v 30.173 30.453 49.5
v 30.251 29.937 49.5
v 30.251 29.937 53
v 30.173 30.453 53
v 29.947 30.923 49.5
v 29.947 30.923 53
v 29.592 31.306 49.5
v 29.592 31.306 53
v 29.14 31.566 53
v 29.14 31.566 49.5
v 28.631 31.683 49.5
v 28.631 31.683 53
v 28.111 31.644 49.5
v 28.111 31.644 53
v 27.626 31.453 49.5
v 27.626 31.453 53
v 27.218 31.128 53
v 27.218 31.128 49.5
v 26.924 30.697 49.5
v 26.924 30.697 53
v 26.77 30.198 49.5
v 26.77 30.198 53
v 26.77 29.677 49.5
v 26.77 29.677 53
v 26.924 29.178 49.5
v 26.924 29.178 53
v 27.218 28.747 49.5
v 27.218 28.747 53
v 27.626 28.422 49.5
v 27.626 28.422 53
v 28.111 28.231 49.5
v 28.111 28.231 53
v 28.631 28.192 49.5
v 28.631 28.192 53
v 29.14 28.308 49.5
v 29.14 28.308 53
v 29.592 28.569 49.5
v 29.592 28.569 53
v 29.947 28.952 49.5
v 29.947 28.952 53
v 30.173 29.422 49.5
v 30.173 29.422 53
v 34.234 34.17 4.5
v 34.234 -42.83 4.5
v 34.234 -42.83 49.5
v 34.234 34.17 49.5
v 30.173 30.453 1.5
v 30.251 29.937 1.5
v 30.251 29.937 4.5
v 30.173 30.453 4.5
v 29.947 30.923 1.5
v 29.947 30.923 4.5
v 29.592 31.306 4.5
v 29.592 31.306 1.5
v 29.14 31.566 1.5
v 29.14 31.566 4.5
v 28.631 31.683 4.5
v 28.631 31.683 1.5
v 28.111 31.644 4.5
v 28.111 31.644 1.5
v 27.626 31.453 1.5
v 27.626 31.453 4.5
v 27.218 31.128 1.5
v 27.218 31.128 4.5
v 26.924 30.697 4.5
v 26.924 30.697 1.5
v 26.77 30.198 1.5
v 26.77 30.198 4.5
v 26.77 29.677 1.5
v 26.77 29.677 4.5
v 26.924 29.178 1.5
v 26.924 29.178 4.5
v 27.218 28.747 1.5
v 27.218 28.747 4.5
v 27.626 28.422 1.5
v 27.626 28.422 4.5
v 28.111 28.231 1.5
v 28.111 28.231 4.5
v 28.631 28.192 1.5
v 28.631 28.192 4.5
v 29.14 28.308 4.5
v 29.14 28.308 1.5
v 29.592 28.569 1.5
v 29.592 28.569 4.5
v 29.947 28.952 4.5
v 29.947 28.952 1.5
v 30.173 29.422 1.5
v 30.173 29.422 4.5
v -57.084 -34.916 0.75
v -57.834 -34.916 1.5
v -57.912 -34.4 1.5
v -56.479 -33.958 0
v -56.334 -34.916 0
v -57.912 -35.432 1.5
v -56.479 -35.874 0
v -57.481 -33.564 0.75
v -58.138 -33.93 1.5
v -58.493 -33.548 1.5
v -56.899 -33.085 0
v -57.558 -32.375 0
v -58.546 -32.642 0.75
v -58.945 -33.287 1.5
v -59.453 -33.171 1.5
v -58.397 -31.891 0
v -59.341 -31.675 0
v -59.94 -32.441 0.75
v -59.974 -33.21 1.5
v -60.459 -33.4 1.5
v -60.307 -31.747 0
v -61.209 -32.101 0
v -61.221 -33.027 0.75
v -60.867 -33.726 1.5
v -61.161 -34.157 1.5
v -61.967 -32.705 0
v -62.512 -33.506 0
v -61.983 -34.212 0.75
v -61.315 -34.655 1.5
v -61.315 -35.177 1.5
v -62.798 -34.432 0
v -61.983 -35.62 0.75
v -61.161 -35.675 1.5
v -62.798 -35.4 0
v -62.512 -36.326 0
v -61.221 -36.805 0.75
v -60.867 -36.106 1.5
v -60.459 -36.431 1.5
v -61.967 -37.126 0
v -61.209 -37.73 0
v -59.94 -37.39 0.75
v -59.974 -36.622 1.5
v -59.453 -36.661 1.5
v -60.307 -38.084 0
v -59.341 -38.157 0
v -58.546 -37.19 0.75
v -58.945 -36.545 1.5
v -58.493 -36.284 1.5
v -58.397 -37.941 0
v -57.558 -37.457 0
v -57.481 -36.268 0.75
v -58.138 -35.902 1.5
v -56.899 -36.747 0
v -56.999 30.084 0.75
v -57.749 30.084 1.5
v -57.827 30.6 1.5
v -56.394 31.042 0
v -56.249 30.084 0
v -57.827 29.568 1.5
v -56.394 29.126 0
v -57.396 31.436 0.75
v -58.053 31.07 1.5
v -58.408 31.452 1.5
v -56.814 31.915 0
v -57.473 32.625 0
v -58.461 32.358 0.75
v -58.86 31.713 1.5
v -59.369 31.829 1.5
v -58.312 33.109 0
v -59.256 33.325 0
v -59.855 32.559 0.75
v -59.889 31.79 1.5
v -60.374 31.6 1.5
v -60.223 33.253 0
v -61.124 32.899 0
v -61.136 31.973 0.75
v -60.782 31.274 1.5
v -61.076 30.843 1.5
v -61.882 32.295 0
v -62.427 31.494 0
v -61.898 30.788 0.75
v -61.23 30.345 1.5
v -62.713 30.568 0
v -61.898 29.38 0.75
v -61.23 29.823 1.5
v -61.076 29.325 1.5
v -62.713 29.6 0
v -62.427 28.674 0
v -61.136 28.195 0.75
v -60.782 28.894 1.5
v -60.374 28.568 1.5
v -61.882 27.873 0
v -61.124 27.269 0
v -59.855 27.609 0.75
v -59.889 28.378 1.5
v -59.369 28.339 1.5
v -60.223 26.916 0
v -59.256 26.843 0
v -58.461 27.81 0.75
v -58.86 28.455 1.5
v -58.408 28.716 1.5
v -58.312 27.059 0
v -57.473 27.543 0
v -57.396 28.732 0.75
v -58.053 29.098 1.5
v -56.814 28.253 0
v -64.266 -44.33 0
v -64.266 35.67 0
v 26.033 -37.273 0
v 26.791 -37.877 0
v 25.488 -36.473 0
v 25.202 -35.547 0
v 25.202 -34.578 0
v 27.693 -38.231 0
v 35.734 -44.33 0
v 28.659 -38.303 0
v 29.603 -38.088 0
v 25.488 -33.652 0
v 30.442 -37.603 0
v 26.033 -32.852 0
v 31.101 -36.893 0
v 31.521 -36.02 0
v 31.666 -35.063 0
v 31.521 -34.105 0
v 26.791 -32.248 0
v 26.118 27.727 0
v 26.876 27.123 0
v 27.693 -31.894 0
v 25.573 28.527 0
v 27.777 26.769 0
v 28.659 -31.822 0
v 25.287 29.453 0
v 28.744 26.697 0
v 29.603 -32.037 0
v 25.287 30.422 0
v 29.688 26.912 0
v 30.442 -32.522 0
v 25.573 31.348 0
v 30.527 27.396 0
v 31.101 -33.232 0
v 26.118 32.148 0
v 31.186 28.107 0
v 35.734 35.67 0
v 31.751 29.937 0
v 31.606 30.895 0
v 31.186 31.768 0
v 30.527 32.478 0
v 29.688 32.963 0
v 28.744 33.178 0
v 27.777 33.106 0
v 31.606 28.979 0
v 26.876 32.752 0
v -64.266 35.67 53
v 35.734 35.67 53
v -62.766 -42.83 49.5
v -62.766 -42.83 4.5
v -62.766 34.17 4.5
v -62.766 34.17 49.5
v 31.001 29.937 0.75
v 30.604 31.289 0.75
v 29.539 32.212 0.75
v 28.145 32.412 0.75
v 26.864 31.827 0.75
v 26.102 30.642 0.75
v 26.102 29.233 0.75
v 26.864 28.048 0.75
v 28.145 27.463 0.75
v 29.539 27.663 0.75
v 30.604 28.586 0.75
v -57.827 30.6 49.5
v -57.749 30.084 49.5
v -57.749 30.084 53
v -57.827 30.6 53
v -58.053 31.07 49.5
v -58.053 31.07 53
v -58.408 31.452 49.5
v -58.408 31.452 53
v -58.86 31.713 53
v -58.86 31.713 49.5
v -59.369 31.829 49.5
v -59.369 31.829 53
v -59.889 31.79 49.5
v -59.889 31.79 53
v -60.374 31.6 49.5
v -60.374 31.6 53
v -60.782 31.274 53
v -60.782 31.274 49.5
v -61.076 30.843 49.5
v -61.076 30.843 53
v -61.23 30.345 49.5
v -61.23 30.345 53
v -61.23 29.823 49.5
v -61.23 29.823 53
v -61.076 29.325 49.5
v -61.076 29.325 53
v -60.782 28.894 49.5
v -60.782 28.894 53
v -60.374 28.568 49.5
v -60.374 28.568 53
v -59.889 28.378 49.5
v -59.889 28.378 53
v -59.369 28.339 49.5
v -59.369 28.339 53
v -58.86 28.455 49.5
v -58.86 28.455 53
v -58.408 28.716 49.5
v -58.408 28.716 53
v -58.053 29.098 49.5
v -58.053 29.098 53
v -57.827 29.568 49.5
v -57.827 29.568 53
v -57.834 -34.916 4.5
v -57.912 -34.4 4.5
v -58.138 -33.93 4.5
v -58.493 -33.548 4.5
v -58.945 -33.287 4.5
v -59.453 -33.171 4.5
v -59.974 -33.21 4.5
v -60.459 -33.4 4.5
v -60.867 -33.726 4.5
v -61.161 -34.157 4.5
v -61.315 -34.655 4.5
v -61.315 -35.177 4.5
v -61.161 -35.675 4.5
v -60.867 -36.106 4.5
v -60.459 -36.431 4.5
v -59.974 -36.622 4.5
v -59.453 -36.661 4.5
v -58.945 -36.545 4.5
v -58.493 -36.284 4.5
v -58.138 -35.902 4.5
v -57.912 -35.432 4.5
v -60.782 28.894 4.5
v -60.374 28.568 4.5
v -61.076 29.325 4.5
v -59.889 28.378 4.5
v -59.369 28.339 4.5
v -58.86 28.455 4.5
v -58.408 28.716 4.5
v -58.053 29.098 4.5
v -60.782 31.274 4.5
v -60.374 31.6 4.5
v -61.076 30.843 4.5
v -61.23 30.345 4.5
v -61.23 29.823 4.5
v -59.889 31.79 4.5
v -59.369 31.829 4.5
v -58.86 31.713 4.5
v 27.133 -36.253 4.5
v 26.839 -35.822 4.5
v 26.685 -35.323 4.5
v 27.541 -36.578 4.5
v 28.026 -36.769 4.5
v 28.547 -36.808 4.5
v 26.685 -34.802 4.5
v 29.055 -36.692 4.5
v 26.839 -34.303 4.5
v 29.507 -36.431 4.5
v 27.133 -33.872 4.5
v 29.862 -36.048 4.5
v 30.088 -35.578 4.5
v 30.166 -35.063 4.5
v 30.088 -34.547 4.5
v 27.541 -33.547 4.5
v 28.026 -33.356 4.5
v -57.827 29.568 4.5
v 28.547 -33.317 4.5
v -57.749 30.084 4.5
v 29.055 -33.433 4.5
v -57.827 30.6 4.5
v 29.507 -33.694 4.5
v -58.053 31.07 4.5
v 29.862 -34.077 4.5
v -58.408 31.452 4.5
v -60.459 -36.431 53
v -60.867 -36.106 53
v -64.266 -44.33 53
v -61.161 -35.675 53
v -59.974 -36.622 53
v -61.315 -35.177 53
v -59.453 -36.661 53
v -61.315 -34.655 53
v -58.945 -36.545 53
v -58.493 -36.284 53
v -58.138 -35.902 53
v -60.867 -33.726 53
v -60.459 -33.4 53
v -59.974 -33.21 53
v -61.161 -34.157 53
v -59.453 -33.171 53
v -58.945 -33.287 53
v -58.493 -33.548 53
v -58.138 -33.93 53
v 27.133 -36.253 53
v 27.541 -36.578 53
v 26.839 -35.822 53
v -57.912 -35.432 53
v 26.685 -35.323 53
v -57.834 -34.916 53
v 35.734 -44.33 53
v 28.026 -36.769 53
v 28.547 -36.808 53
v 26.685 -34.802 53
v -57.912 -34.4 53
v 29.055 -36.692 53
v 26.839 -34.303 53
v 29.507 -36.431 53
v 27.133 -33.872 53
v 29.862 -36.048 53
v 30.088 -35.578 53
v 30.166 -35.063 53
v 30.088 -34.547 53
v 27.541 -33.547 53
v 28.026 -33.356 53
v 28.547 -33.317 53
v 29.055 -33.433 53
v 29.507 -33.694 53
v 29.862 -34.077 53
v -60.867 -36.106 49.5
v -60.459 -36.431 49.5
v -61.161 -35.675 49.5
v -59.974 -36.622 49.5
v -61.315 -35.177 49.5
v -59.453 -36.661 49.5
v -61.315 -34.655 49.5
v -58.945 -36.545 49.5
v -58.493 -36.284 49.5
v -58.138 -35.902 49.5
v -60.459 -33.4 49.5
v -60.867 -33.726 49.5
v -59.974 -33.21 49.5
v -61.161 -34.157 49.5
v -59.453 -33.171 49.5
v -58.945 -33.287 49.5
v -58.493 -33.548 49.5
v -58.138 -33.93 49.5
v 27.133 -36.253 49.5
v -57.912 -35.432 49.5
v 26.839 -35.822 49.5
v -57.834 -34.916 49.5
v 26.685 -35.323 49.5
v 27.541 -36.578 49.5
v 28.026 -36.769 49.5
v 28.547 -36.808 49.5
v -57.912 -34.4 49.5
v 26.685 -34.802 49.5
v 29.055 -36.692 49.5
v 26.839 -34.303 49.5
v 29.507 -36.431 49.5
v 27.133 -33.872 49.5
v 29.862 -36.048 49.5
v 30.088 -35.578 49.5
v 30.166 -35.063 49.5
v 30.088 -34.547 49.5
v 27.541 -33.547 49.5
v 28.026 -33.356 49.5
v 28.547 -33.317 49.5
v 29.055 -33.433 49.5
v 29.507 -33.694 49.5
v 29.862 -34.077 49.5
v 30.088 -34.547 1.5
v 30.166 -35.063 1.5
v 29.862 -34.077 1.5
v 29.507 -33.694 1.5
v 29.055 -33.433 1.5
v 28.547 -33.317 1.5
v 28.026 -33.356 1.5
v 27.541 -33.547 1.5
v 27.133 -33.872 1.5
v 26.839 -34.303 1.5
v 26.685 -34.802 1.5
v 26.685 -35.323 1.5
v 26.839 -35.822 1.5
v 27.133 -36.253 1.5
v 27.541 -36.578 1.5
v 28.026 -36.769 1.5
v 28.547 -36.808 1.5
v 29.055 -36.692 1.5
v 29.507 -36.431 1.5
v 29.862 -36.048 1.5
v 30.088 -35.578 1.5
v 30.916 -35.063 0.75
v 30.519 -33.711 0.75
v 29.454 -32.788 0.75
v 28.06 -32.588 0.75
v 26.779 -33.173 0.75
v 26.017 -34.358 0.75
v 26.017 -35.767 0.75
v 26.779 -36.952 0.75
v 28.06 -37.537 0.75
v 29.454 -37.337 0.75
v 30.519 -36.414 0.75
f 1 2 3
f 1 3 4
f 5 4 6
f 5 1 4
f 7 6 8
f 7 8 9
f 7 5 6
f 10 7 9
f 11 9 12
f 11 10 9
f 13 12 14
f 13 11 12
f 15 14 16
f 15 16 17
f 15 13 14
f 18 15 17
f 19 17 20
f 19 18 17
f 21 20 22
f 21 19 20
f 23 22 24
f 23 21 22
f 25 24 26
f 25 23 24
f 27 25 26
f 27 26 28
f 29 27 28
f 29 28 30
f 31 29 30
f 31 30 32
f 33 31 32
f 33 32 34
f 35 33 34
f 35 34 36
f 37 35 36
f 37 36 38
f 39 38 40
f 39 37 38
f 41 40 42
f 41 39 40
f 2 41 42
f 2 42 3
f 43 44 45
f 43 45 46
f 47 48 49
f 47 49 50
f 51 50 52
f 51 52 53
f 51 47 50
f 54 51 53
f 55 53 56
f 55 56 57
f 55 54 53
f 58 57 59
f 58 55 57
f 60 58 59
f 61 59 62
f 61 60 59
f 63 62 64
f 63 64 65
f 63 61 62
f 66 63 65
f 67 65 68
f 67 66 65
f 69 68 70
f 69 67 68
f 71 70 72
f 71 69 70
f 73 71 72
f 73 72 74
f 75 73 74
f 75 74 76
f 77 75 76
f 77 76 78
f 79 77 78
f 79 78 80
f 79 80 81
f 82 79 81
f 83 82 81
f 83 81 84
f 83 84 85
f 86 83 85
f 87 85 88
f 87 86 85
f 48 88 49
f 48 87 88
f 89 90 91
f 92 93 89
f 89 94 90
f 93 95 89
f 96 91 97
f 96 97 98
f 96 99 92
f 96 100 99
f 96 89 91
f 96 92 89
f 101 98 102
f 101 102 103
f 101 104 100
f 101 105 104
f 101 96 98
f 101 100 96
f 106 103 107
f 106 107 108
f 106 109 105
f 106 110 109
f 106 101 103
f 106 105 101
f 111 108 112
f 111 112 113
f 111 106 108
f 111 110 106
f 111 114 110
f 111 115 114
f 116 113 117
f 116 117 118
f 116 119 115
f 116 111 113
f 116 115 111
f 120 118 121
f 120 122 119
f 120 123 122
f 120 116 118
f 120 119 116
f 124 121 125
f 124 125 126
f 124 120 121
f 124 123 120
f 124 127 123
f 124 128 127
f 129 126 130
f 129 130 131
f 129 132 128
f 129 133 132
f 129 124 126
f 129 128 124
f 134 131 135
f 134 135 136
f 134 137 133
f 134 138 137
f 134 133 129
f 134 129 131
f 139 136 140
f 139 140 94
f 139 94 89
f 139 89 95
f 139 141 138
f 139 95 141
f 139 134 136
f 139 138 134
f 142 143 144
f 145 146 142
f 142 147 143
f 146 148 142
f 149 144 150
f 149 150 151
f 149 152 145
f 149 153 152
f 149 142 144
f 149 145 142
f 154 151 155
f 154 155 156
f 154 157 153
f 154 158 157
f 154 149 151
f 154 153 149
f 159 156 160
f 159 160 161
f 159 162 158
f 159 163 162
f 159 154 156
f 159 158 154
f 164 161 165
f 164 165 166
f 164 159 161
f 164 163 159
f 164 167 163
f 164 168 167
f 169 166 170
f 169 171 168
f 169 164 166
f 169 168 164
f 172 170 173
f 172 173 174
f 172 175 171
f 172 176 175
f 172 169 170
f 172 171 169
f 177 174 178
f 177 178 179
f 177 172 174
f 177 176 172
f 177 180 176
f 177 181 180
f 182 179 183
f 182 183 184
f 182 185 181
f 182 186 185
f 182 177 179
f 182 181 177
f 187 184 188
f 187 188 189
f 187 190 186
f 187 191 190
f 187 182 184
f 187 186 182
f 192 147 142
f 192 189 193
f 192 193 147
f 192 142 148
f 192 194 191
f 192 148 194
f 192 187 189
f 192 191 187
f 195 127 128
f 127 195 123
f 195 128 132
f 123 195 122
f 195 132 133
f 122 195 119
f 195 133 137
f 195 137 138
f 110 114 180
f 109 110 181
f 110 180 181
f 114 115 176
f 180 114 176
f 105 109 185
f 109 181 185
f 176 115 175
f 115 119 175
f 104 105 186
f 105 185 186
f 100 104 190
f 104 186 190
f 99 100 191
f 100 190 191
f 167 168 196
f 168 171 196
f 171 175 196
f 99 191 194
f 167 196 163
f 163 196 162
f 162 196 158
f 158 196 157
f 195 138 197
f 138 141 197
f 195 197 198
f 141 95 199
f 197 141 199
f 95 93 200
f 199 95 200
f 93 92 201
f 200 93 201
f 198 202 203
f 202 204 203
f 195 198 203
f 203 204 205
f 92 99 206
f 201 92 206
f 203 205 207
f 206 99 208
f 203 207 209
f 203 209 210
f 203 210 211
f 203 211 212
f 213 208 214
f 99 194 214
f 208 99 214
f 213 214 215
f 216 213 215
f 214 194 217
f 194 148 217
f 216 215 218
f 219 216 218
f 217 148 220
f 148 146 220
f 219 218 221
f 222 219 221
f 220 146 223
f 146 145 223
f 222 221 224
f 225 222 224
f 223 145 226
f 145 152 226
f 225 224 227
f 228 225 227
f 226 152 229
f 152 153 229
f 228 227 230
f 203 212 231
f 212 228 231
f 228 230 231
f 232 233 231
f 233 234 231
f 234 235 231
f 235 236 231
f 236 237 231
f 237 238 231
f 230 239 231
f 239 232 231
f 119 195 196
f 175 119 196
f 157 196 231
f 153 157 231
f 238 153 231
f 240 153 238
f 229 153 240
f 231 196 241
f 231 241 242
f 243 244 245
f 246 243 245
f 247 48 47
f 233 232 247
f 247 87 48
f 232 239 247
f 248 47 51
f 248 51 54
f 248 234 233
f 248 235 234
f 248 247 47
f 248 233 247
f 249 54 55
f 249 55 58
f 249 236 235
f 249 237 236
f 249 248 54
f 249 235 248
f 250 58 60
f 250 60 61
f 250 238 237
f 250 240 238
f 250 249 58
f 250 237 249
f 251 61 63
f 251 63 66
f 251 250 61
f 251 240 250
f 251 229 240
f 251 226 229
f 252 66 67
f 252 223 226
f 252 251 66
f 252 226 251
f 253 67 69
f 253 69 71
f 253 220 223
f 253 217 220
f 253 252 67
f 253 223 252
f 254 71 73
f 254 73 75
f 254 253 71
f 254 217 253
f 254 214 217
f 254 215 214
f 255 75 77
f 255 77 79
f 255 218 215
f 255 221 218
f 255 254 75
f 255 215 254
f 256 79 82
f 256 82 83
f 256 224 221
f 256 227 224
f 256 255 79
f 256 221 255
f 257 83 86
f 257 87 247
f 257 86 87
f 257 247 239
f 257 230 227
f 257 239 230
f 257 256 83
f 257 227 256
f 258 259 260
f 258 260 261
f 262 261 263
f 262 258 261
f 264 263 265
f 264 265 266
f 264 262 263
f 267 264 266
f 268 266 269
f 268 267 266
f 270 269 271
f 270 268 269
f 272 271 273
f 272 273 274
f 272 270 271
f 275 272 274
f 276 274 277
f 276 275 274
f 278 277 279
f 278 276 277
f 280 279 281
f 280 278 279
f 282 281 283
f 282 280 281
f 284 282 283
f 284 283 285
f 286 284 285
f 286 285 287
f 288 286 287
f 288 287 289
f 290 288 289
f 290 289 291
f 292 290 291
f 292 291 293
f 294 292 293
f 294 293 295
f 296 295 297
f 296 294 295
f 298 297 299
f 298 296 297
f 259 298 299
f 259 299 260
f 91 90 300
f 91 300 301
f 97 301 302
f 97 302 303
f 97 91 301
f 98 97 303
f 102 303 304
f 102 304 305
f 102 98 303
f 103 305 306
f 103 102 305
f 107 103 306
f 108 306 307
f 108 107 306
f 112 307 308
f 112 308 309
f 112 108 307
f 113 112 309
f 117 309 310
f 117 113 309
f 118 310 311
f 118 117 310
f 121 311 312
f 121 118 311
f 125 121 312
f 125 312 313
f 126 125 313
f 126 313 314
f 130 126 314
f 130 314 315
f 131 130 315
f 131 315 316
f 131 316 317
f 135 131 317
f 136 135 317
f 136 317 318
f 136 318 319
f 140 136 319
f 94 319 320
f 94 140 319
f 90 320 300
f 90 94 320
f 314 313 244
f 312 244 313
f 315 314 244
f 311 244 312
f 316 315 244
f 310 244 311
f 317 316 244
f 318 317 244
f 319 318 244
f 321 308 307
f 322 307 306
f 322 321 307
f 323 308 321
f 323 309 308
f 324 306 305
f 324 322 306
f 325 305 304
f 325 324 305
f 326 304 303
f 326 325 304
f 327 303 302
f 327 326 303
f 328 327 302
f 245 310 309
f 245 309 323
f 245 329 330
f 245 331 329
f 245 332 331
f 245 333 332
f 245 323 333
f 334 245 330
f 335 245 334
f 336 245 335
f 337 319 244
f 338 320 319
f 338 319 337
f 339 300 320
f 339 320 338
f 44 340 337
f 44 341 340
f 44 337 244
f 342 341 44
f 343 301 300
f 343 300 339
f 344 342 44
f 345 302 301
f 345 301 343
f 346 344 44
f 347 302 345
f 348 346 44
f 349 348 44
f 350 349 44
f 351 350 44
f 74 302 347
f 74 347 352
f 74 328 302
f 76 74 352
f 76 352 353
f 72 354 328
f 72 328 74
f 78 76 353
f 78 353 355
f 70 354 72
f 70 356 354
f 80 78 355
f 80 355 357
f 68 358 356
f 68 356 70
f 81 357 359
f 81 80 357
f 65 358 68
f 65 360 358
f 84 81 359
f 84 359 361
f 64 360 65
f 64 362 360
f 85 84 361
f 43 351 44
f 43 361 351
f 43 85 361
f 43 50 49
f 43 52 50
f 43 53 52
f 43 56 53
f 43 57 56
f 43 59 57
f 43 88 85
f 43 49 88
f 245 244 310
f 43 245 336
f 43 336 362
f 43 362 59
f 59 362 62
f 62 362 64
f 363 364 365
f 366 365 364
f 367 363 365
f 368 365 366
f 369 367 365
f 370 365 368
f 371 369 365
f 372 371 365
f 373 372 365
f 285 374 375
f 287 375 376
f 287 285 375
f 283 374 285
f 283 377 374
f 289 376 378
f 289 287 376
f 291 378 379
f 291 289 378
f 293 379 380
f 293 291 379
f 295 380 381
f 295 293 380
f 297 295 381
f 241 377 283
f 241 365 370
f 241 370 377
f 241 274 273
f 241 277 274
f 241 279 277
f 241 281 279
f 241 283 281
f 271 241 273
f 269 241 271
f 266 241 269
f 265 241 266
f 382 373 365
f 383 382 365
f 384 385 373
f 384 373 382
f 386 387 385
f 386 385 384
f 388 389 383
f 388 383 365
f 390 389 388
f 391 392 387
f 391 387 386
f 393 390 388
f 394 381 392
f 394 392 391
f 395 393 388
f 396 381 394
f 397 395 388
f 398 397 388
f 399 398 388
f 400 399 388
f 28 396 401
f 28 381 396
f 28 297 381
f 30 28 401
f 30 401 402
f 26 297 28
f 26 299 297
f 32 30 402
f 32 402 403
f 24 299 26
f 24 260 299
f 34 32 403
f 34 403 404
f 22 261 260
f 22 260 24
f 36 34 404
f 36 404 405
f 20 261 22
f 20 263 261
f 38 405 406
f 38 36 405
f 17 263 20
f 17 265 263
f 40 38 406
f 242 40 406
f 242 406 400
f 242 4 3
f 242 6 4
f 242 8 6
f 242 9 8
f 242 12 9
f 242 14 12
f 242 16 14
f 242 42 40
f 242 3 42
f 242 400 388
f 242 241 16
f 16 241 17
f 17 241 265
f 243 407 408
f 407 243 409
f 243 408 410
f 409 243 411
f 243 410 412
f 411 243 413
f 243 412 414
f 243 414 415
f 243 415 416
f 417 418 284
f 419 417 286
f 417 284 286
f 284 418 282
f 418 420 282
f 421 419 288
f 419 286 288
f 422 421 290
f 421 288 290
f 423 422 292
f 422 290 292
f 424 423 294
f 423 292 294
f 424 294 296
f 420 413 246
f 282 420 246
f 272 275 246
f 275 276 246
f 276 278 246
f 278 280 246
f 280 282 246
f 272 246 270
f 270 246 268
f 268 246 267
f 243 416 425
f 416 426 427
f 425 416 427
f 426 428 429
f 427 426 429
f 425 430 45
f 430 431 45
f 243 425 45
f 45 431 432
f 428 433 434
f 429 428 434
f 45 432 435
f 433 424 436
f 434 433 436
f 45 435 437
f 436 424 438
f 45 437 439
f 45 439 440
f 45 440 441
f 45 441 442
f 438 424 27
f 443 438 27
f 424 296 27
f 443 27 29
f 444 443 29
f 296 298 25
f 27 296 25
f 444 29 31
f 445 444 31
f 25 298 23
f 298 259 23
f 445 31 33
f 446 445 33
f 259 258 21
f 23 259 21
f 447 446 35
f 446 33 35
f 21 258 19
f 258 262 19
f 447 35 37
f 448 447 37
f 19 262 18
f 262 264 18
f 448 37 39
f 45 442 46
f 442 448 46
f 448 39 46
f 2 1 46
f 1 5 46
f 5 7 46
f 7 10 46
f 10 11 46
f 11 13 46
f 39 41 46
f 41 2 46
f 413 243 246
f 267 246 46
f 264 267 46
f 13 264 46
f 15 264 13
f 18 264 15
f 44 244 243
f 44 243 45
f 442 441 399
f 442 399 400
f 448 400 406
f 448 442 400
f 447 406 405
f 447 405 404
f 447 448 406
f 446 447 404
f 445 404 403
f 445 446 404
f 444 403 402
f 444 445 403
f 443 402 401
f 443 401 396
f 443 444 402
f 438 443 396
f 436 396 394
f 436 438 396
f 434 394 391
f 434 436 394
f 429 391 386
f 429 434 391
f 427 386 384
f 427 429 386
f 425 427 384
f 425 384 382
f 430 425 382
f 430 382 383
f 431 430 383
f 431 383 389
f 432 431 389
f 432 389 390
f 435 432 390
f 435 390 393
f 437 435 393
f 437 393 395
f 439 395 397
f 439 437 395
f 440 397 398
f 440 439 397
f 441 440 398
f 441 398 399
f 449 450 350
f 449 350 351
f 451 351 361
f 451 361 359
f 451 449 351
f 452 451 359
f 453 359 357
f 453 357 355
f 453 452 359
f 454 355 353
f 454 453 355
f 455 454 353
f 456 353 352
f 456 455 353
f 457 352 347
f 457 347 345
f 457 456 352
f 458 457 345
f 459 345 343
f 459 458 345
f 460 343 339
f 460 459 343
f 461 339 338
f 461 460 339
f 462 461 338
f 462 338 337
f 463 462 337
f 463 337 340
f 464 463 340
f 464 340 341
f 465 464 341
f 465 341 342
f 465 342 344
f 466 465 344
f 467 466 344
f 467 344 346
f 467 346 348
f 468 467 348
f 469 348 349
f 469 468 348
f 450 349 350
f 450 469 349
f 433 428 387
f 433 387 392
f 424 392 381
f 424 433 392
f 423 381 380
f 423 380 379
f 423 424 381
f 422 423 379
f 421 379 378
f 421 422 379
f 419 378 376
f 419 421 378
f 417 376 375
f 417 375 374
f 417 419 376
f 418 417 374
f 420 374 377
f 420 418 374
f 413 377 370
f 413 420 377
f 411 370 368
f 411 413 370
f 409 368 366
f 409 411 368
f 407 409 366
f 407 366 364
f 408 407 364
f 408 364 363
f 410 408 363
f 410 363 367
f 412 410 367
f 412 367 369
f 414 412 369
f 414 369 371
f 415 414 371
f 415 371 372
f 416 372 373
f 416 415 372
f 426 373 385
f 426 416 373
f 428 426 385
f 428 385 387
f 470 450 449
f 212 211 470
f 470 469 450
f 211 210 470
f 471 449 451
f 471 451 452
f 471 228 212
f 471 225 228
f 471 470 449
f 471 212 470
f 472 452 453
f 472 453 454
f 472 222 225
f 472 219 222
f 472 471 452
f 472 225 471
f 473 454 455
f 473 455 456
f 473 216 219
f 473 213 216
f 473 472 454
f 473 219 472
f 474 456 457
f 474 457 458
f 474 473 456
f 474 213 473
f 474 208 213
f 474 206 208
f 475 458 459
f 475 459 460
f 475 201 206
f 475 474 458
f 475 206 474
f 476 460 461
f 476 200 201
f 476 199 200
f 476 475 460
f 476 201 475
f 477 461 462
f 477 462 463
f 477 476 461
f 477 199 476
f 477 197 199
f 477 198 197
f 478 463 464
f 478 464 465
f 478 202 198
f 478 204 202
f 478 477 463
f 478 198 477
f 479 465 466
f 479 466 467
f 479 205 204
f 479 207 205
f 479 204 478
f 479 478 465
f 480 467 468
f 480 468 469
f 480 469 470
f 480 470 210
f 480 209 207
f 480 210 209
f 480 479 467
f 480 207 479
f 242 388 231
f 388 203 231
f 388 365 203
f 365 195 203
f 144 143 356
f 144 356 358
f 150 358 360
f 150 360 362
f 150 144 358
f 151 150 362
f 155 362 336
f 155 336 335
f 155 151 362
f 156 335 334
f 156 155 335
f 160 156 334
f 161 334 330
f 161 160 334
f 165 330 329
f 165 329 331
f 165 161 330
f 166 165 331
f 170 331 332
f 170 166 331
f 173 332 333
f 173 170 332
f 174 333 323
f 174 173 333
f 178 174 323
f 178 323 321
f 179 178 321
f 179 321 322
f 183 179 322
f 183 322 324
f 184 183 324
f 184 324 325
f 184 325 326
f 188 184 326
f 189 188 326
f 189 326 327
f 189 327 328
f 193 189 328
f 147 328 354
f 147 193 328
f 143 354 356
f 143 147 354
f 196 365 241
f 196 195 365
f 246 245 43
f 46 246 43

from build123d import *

# Parameters (mm, degrees)
SKETCH_W      = 100
SKETCH_H      = 80
SKETCH_R      = 1.75
PAD_DEPTH     = 4.5
CHAMFER_SIZE  = 1.5
SKETCH001_W   = 100
SKETCH001_H   = 80
SKETCH001_W_2 = 97
SKETCH001_H_2 = 77
PAD001_DEPTH  = 45
SKETCH002_W   = 100
SKETCH002_H   = 80
SKETCH002_R   = 1.75
PAD002_DEPTH  = 3.5


with BuildPart() as part:
    # Sketch → Pad (new body)
    with BuildSketch(Plane.XY):
        with Locations((-14.266246, -4.330319)):
            Rectangle(SKETCH_W, SKETCH_H)
        with Locations((-59.499317, 30.08403)):
            Circle(SKETCH_R, mode=Mode.SUBTRACT)
        with Locations((28.500683, 29.937424)):
            Circle(SKETCH_R, mode=Mode.SUBTRACT)
        with Locations((-59.584126, -34.915915)):
            Circle(SKETCH_R, mode=Mode.SUBTRACT)
        with Locations((28.415874, -35.062521)):
            Circle(SKETCH_R, mode=Mode.SUBTRACT)
    extrude(amount=PAD_DEPTH)

    # Chamfer
    chamfer_edges = [part.edges().sort_by_distance(p)[0] for p in [
        (-61.334126, -34.915915, 0),
        (26.665874, -35.062521, 0),
        (26.750683, 29.937424, 0),
        (-61.249317, 30.08403, 0),
    ]]
    chamfer(chamfer_edges, length=CHAMFER_SIZE)

    # Sketch001 (on Face3 of Chamfer) → Pad001 (join)
    with BuildSketch(Plane.XY.offset(4.5)):
        with Locations((-14.266246, -4.330319)):
            Rectangle(SKETCH001_W, SKETCH001_H)
        with Locations((-14.266246, -4.330319)):
            Rectangle(SKETCH001_W_2, SKETCH001_H_2, mode=Mode.SUBTRACT)
    extrude(amount=PAD001_DEPTH)

    # Sketch002 (on Face19 of Pad001) → Pad002 (join)
    with BuildSketch(Plane.XY.offset(49.5)):
        with Locations((-14.266246, -4.330319)):
            Rectangle(SKETCH002_W, SKETCH002_H)
        with Locations((-59.499317, 30.08403)):
            Circle(SKETCH002_R, mode=Mode.SUBTRACT)
        with Locations((-59.584126, -34.915915)):
            Circle(SKETCH002_R, mode=Mode.SUBTRACT)
        with Locations((28.500683, 29.937424)):
            Circle(SKETCH002_R, mode=Mode.SUBTRACT)
        with Locations((28.415874, -35.062521)):
            Circle(SKETCH002_R, mode=Mode.SUBTRACT)
    extrude(amount=PAD002_DEPTH)


solid = part.part
